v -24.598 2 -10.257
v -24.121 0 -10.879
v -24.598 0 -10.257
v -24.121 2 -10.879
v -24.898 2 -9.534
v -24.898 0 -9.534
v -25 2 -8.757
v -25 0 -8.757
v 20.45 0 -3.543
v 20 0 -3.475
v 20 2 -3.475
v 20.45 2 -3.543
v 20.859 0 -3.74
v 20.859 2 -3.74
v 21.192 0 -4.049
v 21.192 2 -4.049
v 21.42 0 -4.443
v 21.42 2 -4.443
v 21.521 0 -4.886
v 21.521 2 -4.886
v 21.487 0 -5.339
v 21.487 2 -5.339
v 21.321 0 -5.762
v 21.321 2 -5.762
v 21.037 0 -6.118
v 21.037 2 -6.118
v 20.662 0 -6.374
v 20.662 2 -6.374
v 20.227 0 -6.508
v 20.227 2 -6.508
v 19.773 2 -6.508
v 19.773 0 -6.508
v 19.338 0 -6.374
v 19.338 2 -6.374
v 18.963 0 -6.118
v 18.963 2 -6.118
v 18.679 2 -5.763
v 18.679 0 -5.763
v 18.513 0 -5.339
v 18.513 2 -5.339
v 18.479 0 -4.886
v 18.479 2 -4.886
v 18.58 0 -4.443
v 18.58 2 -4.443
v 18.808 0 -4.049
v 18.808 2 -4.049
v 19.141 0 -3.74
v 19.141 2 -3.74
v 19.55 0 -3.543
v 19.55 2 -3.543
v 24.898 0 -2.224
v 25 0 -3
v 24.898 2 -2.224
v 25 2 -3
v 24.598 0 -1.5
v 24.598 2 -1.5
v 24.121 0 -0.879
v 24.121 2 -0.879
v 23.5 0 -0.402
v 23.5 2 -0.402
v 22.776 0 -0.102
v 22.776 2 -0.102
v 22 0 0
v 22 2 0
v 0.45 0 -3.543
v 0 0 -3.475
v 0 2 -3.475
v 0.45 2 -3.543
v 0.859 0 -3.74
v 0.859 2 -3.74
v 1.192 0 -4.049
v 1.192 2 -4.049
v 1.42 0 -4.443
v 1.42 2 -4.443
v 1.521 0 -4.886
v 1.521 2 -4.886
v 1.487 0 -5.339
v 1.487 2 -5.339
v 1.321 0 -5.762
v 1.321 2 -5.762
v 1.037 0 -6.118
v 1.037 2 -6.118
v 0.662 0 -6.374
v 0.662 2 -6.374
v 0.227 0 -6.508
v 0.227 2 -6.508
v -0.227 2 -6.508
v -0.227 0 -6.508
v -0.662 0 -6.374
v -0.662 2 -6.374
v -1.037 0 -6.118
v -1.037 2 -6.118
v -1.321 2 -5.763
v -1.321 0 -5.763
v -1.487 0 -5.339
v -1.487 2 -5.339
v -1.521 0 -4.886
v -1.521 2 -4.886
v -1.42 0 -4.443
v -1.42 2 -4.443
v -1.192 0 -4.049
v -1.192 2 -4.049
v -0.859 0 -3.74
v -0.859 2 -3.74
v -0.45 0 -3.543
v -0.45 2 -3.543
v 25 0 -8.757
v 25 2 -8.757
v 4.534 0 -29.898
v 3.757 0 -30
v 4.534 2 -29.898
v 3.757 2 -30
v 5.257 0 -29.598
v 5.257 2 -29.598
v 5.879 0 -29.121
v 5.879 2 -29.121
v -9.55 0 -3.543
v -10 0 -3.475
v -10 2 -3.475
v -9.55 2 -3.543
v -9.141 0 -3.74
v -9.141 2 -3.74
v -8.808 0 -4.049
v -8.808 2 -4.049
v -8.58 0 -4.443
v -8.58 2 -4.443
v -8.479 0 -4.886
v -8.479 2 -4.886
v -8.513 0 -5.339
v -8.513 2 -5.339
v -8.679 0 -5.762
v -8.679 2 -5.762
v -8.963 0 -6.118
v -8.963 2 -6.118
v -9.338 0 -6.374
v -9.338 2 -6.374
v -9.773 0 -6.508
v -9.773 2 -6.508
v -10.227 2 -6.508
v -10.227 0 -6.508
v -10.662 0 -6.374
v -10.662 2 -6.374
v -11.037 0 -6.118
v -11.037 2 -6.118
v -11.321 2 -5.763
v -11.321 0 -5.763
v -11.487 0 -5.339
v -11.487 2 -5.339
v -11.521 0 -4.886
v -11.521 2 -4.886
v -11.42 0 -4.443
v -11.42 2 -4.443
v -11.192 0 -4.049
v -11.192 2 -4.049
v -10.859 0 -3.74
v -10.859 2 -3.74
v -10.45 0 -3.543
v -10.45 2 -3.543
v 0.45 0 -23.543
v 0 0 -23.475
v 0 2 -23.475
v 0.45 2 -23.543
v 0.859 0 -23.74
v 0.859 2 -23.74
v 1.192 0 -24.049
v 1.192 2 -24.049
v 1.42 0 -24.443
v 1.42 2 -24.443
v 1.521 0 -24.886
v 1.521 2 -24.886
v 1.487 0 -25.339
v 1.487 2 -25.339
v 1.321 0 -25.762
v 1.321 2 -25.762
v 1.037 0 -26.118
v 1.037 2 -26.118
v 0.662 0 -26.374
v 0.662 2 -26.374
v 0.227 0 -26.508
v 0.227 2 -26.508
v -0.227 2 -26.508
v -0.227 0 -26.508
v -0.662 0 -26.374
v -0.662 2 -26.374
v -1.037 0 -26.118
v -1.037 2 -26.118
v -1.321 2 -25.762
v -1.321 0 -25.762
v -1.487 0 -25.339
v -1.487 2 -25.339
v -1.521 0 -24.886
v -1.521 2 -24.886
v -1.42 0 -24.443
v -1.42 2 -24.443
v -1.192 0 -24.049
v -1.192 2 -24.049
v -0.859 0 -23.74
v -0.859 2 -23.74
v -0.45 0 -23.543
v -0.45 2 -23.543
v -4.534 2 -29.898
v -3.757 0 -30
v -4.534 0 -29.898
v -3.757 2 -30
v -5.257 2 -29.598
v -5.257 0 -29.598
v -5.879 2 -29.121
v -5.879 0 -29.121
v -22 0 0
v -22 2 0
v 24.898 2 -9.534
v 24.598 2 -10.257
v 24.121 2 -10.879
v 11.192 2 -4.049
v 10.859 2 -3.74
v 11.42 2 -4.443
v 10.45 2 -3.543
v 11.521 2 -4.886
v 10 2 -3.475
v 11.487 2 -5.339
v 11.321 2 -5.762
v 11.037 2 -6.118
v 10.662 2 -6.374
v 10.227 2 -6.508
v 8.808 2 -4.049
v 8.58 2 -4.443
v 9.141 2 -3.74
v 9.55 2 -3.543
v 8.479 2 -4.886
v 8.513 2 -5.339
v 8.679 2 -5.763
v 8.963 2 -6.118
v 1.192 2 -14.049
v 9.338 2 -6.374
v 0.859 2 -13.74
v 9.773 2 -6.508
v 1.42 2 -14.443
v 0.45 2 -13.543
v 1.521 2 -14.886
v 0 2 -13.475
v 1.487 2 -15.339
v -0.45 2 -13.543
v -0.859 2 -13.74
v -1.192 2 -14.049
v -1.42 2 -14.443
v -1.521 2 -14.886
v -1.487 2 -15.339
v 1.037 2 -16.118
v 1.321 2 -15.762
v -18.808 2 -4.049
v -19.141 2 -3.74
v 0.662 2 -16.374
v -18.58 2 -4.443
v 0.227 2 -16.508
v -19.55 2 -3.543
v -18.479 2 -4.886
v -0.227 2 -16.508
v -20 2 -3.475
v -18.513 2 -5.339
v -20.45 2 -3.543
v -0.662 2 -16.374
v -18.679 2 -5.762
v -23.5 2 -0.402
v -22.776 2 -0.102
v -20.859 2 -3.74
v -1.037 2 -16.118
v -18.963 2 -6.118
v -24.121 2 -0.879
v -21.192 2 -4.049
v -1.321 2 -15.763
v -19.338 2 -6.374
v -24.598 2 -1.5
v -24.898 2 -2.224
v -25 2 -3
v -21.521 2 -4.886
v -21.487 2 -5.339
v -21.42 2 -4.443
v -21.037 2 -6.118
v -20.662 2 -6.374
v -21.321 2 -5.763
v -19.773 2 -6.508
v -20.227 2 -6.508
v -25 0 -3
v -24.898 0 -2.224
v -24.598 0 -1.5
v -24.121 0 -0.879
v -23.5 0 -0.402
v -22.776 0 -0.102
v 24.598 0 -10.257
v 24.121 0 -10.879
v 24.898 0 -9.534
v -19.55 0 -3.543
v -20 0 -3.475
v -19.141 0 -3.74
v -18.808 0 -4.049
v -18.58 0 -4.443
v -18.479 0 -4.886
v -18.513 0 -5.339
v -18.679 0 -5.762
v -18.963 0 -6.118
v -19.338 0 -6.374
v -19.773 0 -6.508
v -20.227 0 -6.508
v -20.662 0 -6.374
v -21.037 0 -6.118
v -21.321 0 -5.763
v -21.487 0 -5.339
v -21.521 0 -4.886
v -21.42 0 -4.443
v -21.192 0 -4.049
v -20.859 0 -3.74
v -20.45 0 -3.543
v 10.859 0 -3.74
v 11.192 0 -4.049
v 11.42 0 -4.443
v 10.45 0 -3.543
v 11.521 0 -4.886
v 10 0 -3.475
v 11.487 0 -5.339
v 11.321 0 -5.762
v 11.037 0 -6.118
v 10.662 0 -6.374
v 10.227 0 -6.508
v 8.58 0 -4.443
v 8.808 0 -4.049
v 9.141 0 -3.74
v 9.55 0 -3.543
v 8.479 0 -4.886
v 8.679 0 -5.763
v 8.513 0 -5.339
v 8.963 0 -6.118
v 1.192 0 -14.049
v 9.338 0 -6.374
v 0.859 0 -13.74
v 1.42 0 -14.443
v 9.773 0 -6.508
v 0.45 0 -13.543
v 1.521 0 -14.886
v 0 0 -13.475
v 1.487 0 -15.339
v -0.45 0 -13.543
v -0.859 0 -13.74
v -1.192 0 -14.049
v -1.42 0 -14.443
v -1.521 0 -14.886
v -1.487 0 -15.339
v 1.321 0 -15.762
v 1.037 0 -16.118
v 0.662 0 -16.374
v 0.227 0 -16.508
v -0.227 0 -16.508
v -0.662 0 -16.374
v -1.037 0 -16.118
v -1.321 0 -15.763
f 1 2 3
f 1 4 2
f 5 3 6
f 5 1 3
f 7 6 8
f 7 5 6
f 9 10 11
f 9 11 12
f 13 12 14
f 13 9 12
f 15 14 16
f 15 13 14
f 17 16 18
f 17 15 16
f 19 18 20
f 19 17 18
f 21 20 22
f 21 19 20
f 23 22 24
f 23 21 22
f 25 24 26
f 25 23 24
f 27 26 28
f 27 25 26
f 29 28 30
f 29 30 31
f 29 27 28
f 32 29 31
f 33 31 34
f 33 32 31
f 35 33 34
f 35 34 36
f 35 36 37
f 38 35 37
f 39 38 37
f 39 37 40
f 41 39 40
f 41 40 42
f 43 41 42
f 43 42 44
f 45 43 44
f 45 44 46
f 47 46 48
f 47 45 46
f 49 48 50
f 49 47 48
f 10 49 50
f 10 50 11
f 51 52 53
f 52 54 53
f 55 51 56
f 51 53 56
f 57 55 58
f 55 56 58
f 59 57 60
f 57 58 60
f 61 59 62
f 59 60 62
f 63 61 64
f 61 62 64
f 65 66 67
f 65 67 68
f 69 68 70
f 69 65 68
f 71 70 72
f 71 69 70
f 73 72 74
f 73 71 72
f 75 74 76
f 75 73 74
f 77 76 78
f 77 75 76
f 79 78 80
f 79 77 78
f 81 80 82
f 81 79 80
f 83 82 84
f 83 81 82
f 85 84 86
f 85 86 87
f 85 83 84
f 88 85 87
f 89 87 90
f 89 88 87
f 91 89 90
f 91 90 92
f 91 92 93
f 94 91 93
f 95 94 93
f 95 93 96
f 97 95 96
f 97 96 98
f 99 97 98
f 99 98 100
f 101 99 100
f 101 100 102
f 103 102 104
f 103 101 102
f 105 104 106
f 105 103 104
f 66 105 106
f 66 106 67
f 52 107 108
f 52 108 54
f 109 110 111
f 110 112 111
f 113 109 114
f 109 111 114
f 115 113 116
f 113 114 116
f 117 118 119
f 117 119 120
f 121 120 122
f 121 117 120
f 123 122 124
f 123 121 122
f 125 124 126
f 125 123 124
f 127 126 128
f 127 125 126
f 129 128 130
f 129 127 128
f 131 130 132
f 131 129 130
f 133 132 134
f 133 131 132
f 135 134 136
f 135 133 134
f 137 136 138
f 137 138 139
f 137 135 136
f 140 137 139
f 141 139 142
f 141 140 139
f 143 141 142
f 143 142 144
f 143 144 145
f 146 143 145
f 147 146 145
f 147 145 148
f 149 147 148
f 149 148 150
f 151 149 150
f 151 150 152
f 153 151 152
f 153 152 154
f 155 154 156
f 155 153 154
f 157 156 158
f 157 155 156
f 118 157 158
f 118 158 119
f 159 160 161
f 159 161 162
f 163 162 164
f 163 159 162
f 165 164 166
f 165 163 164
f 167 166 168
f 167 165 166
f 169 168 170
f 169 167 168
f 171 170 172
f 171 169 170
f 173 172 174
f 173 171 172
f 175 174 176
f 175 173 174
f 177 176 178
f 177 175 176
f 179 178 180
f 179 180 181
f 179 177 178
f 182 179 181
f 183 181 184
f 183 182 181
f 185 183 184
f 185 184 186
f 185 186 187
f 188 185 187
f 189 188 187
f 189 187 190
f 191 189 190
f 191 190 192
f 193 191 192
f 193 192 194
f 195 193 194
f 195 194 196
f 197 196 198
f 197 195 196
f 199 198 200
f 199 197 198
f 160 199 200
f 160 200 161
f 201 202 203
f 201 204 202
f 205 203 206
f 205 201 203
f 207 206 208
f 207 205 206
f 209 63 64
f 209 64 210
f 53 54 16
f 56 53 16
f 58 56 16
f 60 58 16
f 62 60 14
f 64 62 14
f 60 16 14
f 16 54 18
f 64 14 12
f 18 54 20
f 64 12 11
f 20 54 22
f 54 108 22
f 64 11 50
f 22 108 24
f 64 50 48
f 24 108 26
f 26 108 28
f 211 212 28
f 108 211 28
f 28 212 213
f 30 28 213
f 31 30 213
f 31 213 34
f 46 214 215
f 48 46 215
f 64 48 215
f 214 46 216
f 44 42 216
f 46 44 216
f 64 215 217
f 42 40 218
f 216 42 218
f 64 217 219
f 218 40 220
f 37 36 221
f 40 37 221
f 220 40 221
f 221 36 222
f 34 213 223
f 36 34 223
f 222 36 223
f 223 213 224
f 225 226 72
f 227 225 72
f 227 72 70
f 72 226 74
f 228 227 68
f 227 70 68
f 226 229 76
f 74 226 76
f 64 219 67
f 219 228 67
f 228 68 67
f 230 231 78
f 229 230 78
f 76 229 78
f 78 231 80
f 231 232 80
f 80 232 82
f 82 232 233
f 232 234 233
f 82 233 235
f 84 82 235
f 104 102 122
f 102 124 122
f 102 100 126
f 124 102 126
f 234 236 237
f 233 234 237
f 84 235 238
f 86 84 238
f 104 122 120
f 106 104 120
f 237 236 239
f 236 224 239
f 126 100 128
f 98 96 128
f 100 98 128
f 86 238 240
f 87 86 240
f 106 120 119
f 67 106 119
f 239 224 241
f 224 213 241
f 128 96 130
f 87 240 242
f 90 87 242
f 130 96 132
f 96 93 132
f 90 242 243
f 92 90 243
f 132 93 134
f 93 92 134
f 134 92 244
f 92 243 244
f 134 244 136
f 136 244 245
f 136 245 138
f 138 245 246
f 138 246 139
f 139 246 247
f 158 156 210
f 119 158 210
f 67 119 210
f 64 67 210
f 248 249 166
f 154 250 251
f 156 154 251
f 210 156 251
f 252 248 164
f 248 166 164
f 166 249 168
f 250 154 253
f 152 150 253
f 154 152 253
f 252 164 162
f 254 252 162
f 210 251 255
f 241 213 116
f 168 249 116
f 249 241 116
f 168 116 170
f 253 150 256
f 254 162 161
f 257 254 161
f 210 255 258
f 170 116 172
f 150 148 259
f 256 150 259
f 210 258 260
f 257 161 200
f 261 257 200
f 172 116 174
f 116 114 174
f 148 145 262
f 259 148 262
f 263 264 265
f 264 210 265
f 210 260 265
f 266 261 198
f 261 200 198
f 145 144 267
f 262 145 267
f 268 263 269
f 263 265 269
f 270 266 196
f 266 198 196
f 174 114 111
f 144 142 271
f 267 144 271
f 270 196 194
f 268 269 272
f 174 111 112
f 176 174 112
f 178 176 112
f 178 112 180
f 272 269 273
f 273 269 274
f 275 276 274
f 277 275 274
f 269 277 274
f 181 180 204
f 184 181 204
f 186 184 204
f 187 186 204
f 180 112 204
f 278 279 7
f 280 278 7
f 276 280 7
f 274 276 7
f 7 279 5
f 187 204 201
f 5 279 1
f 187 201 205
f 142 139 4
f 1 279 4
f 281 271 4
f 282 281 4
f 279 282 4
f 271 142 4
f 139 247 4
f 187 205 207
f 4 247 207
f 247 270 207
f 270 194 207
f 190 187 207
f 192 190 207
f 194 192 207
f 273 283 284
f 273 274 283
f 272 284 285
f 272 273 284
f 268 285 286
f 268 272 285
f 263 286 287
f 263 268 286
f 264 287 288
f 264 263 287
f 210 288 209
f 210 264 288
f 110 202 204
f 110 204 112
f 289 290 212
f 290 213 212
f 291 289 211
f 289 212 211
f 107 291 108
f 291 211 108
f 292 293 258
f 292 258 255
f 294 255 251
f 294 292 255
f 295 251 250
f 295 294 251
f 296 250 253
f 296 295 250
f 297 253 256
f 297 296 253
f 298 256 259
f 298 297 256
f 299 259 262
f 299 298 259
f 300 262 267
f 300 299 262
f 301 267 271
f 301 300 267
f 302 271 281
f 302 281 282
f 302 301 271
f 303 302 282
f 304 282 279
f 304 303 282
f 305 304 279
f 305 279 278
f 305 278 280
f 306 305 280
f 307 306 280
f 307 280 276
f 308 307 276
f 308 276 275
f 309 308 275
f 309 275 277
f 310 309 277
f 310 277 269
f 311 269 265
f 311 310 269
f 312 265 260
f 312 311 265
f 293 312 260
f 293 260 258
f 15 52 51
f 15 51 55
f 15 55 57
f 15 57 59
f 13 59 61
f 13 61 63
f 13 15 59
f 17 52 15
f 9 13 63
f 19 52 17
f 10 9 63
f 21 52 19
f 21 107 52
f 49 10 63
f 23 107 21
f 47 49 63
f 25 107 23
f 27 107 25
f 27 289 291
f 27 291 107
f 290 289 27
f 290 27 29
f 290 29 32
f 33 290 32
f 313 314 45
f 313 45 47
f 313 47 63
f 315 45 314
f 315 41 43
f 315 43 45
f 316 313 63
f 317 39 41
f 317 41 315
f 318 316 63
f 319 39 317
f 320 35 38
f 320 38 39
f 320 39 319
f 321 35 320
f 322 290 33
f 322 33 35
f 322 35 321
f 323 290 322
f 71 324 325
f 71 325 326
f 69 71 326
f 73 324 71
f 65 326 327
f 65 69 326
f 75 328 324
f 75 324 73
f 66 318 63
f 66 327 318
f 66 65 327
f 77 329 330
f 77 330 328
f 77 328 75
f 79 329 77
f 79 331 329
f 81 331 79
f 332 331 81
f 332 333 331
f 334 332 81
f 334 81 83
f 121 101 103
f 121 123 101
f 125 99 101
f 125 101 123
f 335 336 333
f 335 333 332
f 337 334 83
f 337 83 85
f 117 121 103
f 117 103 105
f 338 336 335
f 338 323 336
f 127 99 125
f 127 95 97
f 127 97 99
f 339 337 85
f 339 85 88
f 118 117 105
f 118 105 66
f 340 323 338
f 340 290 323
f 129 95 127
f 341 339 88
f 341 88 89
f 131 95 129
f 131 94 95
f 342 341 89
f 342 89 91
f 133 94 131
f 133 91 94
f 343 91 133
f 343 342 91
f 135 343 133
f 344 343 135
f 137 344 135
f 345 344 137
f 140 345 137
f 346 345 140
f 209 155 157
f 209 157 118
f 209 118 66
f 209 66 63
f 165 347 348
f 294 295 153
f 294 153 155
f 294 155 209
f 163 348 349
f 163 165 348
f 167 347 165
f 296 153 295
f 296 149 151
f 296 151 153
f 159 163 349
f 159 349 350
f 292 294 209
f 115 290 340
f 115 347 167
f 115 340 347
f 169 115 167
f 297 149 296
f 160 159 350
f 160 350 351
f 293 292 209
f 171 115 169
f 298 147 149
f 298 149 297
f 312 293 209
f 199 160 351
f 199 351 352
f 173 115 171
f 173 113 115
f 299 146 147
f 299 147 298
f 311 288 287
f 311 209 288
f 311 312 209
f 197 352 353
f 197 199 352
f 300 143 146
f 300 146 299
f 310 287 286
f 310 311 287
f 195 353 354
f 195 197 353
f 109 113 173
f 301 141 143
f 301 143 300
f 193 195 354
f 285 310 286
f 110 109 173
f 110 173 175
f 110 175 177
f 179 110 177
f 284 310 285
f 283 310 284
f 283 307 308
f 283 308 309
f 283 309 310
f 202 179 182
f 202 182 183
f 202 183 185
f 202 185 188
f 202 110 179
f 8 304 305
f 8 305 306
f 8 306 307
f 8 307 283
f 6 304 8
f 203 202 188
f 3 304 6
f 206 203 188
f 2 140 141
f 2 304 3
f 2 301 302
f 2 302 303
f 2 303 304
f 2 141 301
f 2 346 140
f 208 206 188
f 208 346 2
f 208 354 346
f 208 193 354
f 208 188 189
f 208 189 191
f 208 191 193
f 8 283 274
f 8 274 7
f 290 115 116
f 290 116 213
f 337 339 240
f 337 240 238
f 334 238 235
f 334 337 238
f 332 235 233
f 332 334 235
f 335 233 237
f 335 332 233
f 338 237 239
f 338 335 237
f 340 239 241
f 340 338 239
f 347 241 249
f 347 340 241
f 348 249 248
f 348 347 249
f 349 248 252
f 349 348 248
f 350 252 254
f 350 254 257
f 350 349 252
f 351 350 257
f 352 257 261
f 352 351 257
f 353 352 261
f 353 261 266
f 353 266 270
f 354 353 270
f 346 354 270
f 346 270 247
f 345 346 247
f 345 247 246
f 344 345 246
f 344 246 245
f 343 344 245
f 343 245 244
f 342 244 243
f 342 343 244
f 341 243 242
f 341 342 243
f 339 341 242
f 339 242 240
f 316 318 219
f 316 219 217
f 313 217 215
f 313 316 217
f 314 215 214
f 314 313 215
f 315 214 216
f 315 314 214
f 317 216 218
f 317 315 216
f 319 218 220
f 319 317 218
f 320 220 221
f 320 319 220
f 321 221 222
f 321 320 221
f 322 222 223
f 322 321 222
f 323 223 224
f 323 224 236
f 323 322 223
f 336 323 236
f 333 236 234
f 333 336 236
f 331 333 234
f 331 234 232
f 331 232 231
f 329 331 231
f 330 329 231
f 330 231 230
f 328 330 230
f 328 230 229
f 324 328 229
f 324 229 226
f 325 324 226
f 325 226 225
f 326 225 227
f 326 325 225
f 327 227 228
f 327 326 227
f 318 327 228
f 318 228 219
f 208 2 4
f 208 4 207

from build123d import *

# Parameters (mm, degrees)
SKETCH_1_R      = 1.525
EXTRUDE_1_DEPTH = 2
FILLET_1_R      = 3


with BuildPart() as part:
    # 草图1 → 凸台-拉伸1 (new body)
    with BuildSketch(Plane(origin=(0, 0, 0), x_dir=(1, 0, 0), z_dir=(0, 1, 0))):
        Polygon((-5, 30), (5, 30), (25, 10), (25, 0), (-25, 0), (-25, 10), align=None)
        with Locations(Location((0, 25, 0), (0, 0, 270))):
            Circle(SKETCH_1_R, mode=Mode.SUBTRACT)
        with Locations(Location((0, 15, 0), (0, 0, 270))):
            Circle(SKETCH_1_R, mode=Mode.SUBTRACT)
        with Locations(Location((0, 5, 0), (0, 0, 270))):
            Circle(SKETCH_1_R, mode=Mode.SUBTRACT)
        with Locations(Location((10, 5, 0), (0, 0, 270))):
            Circle(SKETCH_1_R, mode=Mode.SUBTRACT)
        with Locations(Location((-10, 5, 0), (0, 0, 270))):
            Circle(SKETCH_1_R, mode=Mode.SUBTRACT)
        with Locations(Location((20, 5, 0), (0, 0, 270))):
            Circle(SKETCH_1_R, mode=Mode.SUBTRACT)
        with Locations(Location((-20, 5, 0), (0, 0, 270))):
            Circle(SKETCH_1_R, mode=Mode.SUBTRACT)
    extrude(amount=EXTRUDE_1_DEPTH)

    # 圆角1
    fillet_1_edges = [part.edges().sort_by_distance(p)[0] for p in [
        (-5, 1, -30),
        (5, 1, -30),
        (25, 1, -10),
        (25, 1, 0),
        (-25, 1, 0),
        (-25, 1, -10),
    ]]
    fillet(fillet_1_edges, radius=FILLET_1_R)


solid = part.part
